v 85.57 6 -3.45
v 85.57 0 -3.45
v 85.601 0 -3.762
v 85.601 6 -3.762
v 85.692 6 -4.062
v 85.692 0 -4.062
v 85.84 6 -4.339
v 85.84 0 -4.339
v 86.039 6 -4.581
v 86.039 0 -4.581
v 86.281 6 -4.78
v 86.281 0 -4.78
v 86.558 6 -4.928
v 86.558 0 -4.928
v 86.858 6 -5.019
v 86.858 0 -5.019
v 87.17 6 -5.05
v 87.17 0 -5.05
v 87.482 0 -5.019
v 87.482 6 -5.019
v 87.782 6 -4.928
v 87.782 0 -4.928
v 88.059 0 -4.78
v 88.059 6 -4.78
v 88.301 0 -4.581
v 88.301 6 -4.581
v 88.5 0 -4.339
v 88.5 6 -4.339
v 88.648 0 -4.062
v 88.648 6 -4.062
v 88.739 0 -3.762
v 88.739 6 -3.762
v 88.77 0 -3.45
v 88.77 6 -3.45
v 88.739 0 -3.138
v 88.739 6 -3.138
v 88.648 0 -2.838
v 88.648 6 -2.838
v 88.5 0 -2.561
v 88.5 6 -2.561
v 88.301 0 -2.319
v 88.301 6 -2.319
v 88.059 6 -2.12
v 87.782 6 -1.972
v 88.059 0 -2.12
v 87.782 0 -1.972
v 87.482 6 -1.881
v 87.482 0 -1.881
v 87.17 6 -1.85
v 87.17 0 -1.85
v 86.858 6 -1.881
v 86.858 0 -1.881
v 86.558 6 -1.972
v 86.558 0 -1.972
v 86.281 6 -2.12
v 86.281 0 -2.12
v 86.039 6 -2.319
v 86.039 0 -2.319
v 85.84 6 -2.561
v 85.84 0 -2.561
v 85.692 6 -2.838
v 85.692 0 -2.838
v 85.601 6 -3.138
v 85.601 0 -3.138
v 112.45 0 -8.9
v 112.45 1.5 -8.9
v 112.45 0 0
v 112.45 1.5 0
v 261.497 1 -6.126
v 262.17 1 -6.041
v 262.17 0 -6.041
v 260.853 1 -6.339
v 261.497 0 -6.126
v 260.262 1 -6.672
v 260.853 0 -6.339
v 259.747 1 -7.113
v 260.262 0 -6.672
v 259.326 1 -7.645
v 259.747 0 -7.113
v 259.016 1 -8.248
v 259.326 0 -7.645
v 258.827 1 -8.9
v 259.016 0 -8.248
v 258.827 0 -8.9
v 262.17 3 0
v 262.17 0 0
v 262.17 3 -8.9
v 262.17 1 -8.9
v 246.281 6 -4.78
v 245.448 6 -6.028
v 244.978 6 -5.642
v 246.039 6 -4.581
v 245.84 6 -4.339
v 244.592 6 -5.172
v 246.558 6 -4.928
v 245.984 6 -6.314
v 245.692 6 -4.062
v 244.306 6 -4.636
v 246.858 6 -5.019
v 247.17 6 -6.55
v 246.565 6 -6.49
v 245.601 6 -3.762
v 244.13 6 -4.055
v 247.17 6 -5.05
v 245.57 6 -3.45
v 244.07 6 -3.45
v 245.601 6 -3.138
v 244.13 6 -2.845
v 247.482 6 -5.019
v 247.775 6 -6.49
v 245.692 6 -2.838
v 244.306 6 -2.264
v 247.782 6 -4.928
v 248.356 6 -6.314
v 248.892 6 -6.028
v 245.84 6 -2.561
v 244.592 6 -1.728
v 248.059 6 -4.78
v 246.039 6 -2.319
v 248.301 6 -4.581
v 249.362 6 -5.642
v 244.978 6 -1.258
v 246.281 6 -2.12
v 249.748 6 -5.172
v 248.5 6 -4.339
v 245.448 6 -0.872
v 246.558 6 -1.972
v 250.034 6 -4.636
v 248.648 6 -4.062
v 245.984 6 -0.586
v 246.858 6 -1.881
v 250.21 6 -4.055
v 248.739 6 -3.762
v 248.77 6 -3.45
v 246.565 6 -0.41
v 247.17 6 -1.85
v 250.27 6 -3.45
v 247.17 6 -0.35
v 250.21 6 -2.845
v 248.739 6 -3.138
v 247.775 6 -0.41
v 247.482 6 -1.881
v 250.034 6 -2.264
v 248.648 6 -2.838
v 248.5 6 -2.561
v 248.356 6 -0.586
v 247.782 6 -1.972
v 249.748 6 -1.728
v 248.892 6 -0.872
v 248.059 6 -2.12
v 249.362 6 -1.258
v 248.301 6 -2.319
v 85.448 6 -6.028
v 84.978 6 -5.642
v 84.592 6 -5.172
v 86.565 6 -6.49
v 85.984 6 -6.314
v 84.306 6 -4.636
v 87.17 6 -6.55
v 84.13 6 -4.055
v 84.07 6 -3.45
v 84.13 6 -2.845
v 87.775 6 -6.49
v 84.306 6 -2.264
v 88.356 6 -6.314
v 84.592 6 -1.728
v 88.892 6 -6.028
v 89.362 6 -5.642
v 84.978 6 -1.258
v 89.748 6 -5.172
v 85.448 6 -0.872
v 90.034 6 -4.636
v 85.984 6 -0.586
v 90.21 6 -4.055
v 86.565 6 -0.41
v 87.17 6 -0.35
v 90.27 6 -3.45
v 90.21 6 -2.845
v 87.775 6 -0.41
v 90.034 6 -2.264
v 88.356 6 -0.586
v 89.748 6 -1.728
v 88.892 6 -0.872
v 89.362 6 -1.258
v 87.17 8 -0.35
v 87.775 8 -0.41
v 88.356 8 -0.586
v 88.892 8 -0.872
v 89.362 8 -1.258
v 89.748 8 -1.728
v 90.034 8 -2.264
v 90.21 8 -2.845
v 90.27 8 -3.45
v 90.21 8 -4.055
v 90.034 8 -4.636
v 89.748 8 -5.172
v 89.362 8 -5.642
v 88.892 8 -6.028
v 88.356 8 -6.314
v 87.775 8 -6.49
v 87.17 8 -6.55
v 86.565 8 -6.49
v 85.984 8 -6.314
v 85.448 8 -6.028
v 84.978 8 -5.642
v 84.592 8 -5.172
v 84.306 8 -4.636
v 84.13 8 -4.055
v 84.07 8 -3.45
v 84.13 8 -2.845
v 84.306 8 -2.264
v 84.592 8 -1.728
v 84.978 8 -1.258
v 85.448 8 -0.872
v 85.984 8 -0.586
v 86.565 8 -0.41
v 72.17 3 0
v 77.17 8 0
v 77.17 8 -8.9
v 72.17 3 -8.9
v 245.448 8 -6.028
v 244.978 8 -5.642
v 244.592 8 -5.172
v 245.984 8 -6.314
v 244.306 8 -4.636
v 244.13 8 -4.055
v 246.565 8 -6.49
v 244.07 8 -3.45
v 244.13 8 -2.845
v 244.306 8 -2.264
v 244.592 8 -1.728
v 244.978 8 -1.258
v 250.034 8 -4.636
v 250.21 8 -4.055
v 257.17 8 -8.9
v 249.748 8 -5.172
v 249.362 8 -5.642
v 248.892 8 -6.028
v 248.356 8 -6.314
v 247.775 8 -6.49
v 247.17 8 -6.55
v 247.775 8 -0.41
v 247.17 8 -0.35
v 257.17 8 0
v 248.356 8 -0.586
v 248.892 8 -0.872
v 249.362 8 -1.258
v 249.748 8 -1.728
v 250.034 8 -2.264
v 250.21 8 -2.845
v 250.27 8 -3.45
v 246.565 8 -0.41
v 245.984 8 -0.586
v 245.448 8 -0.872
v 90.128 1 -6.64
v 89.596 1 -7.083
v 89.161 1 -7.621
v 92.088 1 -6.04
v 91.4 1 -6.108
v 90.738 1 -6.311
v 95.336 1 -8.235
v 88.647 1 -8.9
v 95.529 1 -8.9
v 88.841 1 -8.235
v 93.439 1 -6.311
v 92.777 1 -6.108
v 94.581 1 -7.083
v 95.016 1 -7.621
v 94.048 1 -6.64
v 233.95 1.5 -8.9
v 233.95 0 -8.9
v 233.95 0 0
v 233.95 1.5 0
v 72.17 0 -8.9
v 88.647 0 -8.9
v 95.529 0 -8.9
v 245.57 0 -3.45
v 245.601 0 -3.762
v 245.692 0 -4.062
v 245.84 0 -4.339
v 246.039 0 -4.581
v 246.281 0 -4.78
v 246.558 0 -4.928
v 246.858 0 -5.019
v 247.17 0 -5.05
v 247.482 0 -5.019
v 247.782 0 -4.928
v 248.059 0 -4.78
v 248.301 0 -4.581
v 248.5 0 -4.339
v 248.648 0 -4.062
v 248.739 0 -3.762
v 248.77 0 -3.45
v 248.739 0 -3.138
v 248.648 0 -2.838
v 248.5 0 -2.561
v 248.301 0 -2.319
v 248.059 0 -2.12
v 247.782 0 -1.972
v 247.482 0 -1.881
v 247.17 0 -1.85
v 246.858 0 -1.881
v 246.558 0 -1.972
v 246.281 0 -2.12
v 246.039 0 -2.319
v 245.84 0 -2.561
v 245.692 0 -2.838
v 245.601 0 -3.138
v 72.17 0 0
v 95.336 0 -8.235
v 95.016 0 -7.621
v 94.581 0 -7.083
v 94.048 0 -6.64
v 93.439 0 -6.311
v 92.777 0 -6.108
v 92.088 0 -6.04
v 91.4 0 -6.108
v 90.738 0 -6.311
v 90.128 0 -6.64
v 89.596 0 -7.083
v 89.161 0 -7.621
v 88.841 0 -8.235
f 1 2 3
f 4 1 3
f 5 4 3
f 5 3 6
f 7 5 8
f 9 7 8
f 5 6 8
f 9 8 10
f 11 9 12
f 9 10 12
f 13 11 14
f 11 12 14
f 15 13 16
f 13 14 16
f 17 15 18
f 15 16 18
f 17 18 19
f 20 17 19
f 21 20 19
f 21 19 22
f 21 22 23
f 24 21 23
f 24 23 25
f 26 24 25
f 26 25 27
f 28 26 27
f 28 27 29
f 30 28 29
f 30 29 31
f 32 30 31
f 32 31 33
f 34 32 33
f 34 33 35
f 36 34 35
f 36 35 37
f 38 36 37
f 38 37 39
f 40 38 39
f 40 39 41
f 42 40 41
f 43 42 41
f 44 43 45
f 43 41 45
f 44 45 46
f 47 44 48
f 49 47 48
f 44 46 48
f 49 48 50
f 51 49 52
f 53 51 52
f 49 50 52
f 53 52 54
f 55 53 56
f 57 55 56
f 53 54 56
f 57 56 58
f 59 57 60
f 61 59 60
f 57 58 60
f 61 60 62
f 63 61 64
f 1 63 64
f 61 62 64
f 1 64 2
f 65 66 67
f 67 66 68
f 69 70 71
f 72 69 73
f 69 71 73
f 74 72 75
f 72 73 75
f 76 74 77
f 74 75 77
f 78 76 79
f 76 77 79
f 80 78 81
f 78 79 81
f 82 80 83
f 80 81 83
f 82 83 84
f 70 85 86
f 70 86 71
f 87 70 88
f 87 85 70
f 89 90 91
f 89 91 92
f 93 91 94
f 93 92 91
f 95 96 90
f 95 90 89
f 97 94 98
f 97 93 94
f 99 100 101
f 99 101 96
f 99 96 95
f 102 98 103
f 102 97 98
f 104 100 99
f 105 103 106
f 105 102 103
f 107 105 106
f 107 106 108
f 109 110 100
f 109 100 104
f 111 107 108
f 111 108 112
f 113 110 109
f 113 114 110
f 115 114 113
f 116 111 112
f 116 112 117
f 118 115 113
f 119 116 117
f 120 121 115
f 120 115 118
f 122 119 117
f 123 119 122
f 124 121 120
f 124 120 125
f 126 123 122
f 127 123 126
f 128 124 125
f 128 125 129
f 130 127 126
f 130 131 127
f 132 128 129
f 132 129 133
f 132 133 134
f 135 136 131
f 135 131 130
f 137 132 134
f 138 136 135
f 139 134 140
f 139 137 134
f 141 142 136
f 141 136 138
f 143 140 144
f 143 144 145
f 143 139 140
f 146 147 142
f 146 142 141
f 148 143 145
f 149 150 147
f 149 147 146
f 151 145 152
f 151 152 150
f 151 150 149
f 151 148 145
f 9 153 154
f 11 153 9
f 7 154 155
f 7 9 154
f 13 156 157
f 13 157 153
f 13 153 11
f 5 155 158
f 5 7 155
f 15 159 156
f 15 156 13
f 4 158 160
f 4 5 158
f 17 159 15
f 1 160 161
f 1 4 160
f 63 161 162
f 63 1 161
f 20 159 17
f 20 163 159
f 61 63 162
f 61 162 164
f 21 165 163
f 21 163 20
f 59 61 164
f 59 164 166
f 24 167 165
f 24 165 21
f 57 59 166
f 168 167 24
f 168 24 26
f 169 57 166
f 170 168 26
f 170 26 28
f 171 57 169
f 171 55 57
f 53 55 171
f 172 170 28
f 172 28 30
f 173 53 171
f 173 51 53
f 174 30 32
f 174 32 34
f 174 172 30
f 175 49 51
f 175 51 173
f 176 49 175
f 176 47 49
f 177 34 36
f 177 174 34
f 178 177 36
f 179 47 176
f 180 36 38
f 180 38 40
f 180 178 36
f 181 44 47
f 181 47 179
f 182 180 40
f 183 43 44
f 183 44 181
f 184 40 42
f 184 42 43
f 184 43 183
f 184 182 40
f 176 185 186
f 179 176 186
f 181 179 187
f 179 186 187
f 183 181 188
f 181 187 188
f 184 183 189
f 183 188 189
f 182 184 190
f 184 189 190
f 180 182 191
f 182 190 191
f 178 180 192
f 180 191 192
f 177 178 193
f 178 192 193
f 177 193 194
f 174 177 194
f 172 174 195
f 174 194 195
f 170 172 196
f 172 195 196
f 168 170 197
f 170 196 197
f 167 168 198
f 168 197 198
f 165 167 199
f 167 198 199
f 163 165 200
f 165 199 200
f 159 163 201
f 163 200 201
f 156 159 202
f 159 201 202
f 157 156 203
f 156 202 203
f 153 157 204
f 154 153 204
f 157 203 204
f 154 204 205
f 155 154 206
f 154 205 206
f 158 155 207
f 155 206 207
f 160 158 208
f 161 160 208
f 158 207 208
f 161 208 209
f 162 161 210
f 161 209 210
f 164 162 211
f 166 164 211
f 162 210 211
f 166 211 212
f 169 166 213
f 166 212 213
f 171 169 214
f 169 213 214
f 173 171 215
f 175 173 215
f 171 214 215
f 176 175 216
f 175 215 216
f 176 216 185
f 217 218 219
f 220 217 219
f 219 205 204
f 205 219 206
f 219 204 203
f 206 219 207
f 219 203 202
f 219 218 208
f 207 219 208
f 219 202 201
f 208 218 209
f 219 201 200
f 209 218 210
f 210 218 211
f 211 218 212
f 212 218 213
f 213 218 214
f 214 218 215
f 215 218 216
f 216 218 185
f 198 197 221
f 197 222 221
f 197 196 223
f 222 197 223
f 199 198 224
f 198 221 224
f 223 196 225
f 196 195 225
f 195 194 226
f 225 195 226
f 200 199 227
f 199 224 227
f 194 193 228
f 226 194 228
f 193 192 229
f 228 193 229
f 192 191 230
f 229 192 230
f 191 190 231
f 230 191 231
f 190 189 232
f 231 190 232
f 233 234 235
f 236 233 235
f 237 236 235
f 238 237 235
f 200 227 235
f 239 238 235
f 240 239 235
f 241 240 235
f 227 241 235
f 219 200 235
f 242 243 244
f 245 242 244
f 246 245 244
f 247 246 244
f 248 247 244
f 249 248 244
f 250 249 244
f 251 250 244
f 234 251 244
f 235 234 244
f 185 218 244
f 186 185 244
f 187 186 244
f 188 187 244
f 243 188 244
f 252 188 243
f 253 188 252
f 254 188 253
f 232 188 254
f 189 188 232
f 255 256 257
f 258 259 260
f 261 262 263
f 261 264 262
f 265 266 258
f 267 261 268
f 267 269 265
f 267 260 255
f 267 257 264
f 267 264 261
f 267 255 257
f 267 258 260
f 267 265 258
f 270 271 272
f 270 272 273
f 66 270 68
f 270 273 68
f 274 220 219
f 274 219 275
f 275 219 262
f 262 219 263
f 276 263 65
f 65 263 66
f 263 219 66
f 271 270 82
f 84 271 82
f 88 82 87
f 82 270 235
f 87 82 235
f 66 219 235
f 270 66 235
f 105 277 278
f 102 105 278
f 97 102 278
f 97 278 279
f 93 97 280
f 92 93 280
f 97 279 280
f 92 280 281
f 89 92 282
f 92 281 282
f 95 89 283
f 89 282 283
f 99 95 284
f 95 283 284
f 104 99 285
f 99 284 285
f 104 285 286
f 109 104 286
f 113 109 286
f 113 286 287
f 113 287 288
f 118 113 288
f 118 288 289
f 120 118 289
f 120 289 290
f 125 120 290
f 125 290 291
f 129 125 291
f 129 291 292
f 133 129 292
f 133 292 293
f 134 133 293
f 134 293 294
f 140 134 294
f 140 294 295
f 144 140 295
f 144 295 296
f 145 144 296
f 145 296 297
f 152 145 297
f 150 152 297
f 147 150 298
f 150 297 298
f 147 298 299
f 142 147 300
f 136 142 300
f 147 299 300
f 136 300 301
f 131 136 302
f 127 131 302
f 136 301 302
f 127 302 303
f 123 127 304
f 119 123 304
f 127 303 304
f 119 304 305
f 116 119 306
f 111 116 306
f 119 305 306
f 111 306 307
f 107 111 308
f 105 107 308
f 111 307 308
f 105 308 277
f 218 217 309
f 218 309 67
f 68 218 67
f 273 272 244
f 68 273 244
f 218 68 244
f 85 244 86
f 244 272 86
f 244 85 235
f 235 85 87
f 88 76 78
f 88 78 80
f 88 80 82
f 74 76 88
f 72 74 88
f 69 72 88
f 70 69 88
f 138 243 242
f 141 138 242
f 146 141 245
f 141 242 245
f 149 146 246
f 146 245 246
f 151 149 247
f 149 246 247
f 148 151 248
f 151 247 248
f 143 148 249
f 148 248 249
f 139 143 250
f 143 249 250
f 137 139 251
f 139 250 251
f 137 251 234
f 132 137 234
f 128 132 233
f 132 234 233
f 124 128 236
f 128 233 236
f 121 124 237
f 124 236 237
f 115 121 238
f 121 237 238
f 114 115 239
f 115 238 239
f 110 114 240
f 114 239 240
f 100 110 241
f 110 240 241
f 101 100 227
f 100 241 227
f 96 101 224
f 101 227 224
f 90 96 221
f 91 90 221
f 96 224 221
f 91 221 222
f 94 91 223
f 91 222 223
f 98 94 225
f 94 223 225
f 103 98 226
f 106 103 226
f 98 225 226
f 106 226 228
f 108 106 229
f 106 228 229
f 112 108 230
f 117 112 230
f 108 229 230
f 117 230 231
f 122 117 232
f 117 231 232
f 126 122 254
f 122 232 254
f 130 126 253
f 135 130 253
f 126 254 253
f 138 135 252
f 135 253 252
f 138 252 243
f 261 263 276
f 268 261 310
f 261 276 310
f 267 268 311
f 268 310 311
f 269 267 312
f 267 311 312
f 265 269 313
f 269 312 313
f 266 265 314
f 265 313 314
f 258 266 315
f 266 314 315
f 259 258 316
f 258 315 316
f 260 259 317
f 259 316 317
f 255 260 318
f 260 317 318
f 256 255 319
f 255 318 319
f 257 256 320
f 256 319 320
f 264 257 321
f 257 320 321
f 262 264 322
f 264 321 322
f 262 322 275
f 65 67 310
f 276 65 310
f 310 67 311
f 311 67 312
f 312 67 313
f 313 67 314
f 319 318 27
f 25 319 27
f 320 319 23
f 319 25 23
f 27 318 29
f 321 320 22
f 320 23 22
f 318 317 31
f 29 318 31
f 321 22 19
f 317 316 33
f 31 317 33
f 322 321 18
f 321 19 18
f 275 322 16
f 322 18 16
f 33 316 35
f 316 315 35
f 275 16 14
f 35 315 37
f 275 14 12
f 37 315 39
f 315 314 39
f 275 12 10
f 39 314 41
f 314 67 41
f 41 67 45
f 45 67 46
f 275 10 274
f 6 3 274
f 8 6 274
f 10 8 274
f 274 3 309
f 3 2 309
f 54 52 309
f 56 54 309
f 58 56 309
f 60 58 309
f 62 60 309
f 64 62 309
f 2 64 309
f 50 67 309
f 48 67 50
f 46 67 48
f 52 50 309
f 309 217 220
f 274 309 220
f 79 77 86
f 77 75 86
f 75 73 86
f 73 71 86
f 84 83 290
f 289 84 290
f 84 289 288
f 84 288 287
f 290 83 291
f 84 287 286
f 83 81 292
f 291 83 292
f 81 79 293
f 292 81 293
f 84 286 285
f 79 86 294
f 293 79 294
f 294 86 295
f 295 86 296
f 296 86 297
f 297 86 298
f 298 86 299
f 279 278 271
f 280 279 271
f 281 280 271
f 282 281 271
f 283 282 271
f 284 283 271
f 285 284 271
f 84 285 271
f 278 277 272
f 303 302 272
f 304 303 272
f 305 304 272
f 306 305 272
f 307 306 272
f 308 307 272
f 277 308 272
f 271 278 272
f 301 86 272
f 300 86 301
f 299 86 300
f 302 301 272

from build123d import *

# Parameters (mm, degrees)
SKETCH_1_W              = 337.35
SKETCH_1_H              = 116.87
SKETCH_1_W_2            = 324.05
SKETCH_1_H_2            = 103.07
EXTRUDE_1_DEPTH         = 8
FILLET_1_R              = 5
HOLE_WIZARD_3_2_3_2_1_D = 3.2
SKETCH_5_W              = 32
SKETCH_5_H              = 1.5
CUT_EXTRUDE_1_DEPTH     = 355.911853
EXTRUDE_2_REACH         = 356.912
SKETCH_6_W              = 3
SKETCH_6_H              = 8
SKETCH_7_W              = 257.05
SKETCH_7_H              = 8
EXTRUDE_3_DEPTH         = 4
SKETCH_8_W              = 257.05
SKETCH_8_H              = 4
EXTRUDE_4_DEPTH         = 3
SKETCH_11_W             = 99.07
SKETCH_11_H             = 11
EXTRUDE_5_DEPTH         = 2
SKETCH_13_W             = 42
SKETCH_13_H             = 4.5
CUT_EXTRUDE_2_DEPTH     = 354.692894189
SKETCH_14_W             = 121.5
SKETCH_14_H             = 1.5
CUT_EXTRUDE_3_DEPTH     = 355.911853
SKETCH_16_W             = 32
SKETCH_16_H             = 6.5
EXTRUDE_7_DEPTH         = 4
SKETCH_17_W             = 103.07
SKETCH_17_H             = 3
CUT_EXTRUDE_4_DEPTH     = 0.1
EXTRUDE_8_DEPTH         = 2
SKETCH_19_W             = 70.55
SKETCH_19_H             = 2
SKETCH_19_W_2           = 95
EXTRUDE_9_DEPTH         = 3
SKETCH_20_R             = 3.5
CUT_EXTRUDE_5_DEPTH     = 4
SKETCH_21_R             = 3.1
CUT_EXTRUDE_6_DEPTH     = 2
EXTRUDE_10_DEPTH        = 2
EXTRUDE_10_DEPTH_BACK   = 3
SKETCH_22_W             = 6
SKETCH_22_H             = 6
SKETCH_22_R             = 1.5
SKETCH_23_W             = 10
SKETCH_23_H             = 1.5
SKETCH_23_W_2           = 15
CUT_EXTRUDE_7_DEPTH     = 6.9
SKETCH_24_W             = 103.07
SKETCH_24_H             = 3
CUT_EXTRUDE_8_DEPTH     = 358.110094229
SKETCH_25_W             = 402.768513644
SKETCH_25_H             = 192.082702388
SKETCH_25_W_2           = 190
SKETCH_25_H_2           = 48.964424343
CUT_EXTRUDE_9_DEPTH     = 358.110094229
CHAMFER_1_SIZE          = 5


with BuildPart() as part:
    # 草图1 → 凸台-拉伸1 (new body)
    with BuildSketch(Plane(origin=(0, 0, 0), x_dir=(1, 0, 0), z_dir=(0, 1, 0))):
        with Locations((168.675, 58.435)):
            Rectangle(SKETCH_1_W, SKETCH_1_H)
        with Locations((168.925, 58.435)):
            Rectangle(SKETCH_1_W_2, SKETCH_1_H_2, mode=Mode.SUBTRACT)
    extrude(amount=EXTRUDE_1_DEPTH)

    # 圆角1
    fillet_1_edges = [part.edges().sort_by_distance(p)[0] for p in [
        (0, 4, -116.87),
        (337.35, 4, -116.87),
        (337.35, 4, 0),
        (0, 4, 0),
    ]]
    fillet(fillet_1_edges, radius=FILLET_1_R)

    # Ø3.2 (3.2) 直径孔1 (through all)
    with Locations(Plane(origin=(0, 8, 0), x_dir=(1, 0, 0), z_dir=(0, 1, 0))):
        with Locations((3.45, 98.435), (87.17, 113.42), (247.17, 113.42), (334.15, 98.435), (334.15, 18.435), (247.17, 3.45), (87.17, 3.45), (3.45, 18.435)):
            Hole(HOLE_WIZARD_3_2_3_2_1_D / 2)

    # 草图5 → 切除-拉伸1 (cut, through all)
    with BuildSketch(Plane.XY.offset(-109.97)):
        with Locations((57.9, 0.75)):
            Rectangle(SKETCH_5_W, SKETCH_5_H)
    extrude(amount=-CUT_EXTRUDE_1_DEPTH, mode=Mode.SUBTRACT)

    # 草图6 → 凸台-拉伸2 (add, up to next)
    with BuildSketch(Plane.XY.offset(-109.97), mode=Mode.PRIVATE) as extrude_2_sk1:
        with Locations((40.4, 4)):
            Rectangle(SKETCH_6_W, SKETCH_6_H)
    extrude_2_tool1 = extrude(extrude_2_sk1.sketch, amount=EXTRUDE_2_REACH, mode=Mode.PRIVATE) - part.part
    add(extrude_2_tool1.solids().sort_by_distance((40.4, 4, -109.97))[0])

    # 草图7 → 凸台-拉伸3 (add)
    with BuildSketch(Plane.XY.offset(-109.97)):
        with Locations((202.425, 4)):
            Rectangle(SKETCH_7_W, SKETCH_7_H)
    extrude(amount=EXTRUDE_3_DEPTH)

    # 草图8 → 凸台-拉伸4 (add)
    with BuildSketch(Plane.XZ):
        with Locations((202.425, -107.97)):
            Rectangle(SKETCH_8_W, SKETCH_8_H)
    extrude(amount=EXTRUDE_4_DEPTH)

    # 草图11 → 凸台-拉伸5 (add)
    with BuildSketch(Plane.ZY.offset(-330.95)):
        with Locations((-56.435, 2.5)):
            Rectangle(SKETCH_11_W, SKETCH_11_H)
    extrude(amount=EXTRUDE_5_DEPTH)

    # 草图13 → 切除-拉伸2 (cut, through all)
    with BuildSketch(Plane.XY.offset(-105.97)):
        with Locations((307.95, -0.75)):
            Rectangle(SKETCH_13_W, SKETCH_13_H)
    extrude(amount=-CUT_EXTRUDE_2_DEPTH, mode=Mode.SUBTRACT)

    # 草图14 → 切除-拉伸3 (cut, through all)
    with BuildSketch(Plane(origin=(0, 0, -6.9), x_dir=(-1, 0, 0), z_dir=(0, 0, -1))):
        with Locations((-173.2, 0.75)):
            Rectangle(SKETCH_14_W, SKETCH_14_H)
    extrude(amount=-CUT_EXTRUDE_3_DEPTH, mode=Mode.SUBTRACT)

    # 草图16 → 凸台-拉伸7 (add)
    with BuildSketch(Plane.XY.offset(-109.97)):
        with Locations((57.9, 4.75)):
            Rectangle(SKETCH_16_W, SKETCH_16_H)
    extrude(amount=EXTRUDE_7_DEPTH)

    # 草图17 → 切除-拉伸4 (cut)
    with BuildSketch(Plane(origin=(330.95, 0, 0), x_dir=(0, 0, -1), z_dir=(1, 0, 0))):
        with Locations((58.435, -1.5)):
            Rectangle(SKETCH_17_W, SKETCH_17_H)
    extrude(amount=-CUT_EXTRUDE_4_DEPTH, mode=Mode.SUBTRACT)

    # 草图18 → 凸台-拉伸8 (add)
    with BuildSketch(Plane(origin=(0, 0, -6.9), x_dir=(-1, 0, 0), z_dir=(0, 0, -1))):
        Polygon((-233.95, 0), (-233.95, 1.5), (-112.45, 1.5), (-112.45, 0), (-41.9, 0), (-41.9, 8), (-328.95, 8), (-328.95, 0), align=None)
    extrude(amount=EXTRUDE_8_DEPTH)

    # 草图19 → 凸台-拉伸9 (add)
    with BuildSketch(Plane.XZ):
        with Locations((77.175, -7.9)):
            Rectangle(SKETCH_19_W, SKETCH_19_H)
        with Locations((281.45, -7.9)):
            Rectangle(SKETCH_19_W_2, SKETCH_19_H)
    extrude(amount=EXTRUDE_9_DEPTH)

    # 草图20 → 切除-拉伸5 (cut)
    with BuildSketch(Plane.XZ.offset(3)):
        with Locations((92.088456012, -9.54)):
            Circle(SKETCH_20_R)
        with Locations((262.268456012, -9.54)):
            Circle(SKETCH_20_R)
        with Locations((328.308456012, -13.35)):
            Circle(SKETCH_20_R)
        with Locations((328.308456012, -74.31)):
            Circle(SKETCH_20_R)
        with Locations((137.808456012, -107.33)):
            Circle(SKETCH_20_R)
        with Locations((22.238456012, -9.54)):
            Circle(SKETCH_20_R)
        with Locations((9.538456012, -23.51)):
            Circle(SKETCH_20_R)
        with Locations((9.538456012, -103.52)):
            Circle(SKETCH_20_R)
    extrude(amount=-CUT_EXTRUDE_5_DEPTH, mode=Mode.SUBTRACT)

    # 草图21 → 切除-拉伸6 (cut)
    with BuildSketch(Plane(origin=(0, 8, 0), x_dir=(1, 0, 0), z_dir=(0, 1, 0))):
        with Locations(Location((87.17, 113.42, 0), (0, 0, 270))):
            Circle(SKETCH_21_R)
        with Locations(Location((247.17, 113.42, 0), (0, 0, 270))):
            Circle(SKETCH_21_R)
        with Locations(Location((334.15, 98.435, 0), (0, 0, 270))):
            Circle(SKETCH_21_R)
        with Locations(Location((334.15, 18.435, 0), (0, 0, 270))):
            Circle(SKETCH_21_R)
        with Locations(Location((247.17, 3.45, 0), (0, 0, 270))):
            Circle(SKETCH_21_R)
        with Locations(Location((87.17, 3.45, 0), (0, 0, 270))):
            Circle(SKETCH_21_R)
        with Locations(Location((3.45, 18.435, 0), (0, 0, 270))):
            Circle(SKETCH_21_R)
        with Locations(Location((3.45, 98.435, 0), (0, 0, 270))):
            Circle(SKETCH_21_R)
    extrude(amount=-CUT_EXTRUDE_6_DEPTH, mode=Mode.SUBTRACT)

    # 草图22 → 凸台-拉伸10 (add, two sides: drawn at the far end of the back side and taken through both)
    # profile 1 of 4: a face of its own
    with BuildSketch(Plane(origin=(0, 4, 0), x_dir=(1, 0, 0), z_dir=(0, 1, 0)).offset(-EXTRUDE_10_DEPTH_BACK)):
        with Locations((9.9, 106.97)):
            Rectangle(SKETCH_22_W, SKETCH_22_H)
        with Locations(Location((9.9, 106.97, 0), (0, 0, 90))):
            Circle(SKETCH_22_R, mode=Mode.SUBTRACT)
    # profile 2 of 4: a face of its own
    with BuildSketch(Plane(origin=(0, 4, 0), x_dir=(1, 0, 0), z_dir=(0, 1, 0)).offset(-EXTRUDE_10_DEPTH_BACK)):
        with Locations((35.9, 106.97)):
            Rectangle(SKETCH_22_W, SKETCH_22_H)
        with Locations(Location((35.9, 106.97, 0), (0, 0, 90))):
            Circle(SKETCH_22_R, mode=Mode.SUBTRACT)
    # profile 3 of 4: a face of its own
    with BuildSketch(Plane(origin=(0, 4, 0), x_dir=(1, 0, 0), z_dir=(0, 1, 0)).offset(-EXTRUDE_10_DEPTH_BACK)):
        with Locations((9.9, 9.9)):
            Rectangle(SKETCH_22_W, SKETCH_22_H)
        with Locations(Location((9.9, 9.9, 0), (0, 0, 90))):
            Circle(SKETCH_22_R, mode=Mode.SUBTRACT)
    # profile 4 of 4: a face of its own
    with BuildSketch(Plane(origin=(0, 4, 0), x_dir=(1, 0, 0), z_dir=(0, 1, 0)).offset(-EXTRUDE_10_DEPTH_BACK)):
        with Locations((35.9, 9.9)):
            Rectangle(SKETCH_22_W, SKETCH_22_H)
        with Locations(Location((35.9, 9.9, 0), (0, 0, 90))):
            Circle(SKETCH_22_R, mode=Mode.SUBTRACT)
    extrude(amount=EXTRUDE_10_DEPTH + EXTRUDE_10_DEPTH_BACK)

    # 草图23 → 切除-拉伸7 (cut)
    with BuildSketch(Plane.ZY):
        with Locations((-63.435, 0.75)):
            Rectangle(SKETCH_23_W, SKETCH_23_H)
        with Locations((-50.935, 0.75)):
            Rectangle(SKETCH_23_W_2, SKETCH_23_H)
    extrude(amount=-CUT_EXTRUDE_7_DEPTH, mode=Mode.SUBTRACT)

    # 草图24 → 切除-拉伸8 (cut, through all)
    with BuildSketch(Plane(origin=(337.35, 0, 0), x_dir=(0, 0, -1), z_dir=(1, 0, 0))):
        with Locations((58.435, -1.5)):
            Rectangle(SKETCH_24_W, SKETCH_24_H)
    extrude(amount=-CUT_EXTRUDE_8_DEPTH, mode=Mode.SUBTRACT)

    # 草图25 → 切除-拉伸9 (cut, through all)
    with BuildSketch(Plane(origin=(0, 8, 0), x_dir=(1, 0, 0), z_dir=(0, 1, 0))):
        with Locations((167.276381716, 50.966242561)):
            Rectangle(SKETCH_25_W, SKETCH_25_H)
        with Locations((167.17, 6.206921893)):
            Rectangle(SKETCH_25_W_2, SKETCH_25_H_2, mode=Mode.SUBTRACT)
    extrude(amount=-CUT_EXTRUDE_9_DEPTH, mode=Mode.SUBTRACT)

    # 倒角1
    chamfer_1_edges = [part.edges().sort_by_distance(p)[0] for p in [
        (72.17, 8, -4.45),
        (262.17, 8, -4.45),
    ]]
    chamfer(chamfer_1_edges, length=CHAMFER_1_SIZE)


solid = part.part
